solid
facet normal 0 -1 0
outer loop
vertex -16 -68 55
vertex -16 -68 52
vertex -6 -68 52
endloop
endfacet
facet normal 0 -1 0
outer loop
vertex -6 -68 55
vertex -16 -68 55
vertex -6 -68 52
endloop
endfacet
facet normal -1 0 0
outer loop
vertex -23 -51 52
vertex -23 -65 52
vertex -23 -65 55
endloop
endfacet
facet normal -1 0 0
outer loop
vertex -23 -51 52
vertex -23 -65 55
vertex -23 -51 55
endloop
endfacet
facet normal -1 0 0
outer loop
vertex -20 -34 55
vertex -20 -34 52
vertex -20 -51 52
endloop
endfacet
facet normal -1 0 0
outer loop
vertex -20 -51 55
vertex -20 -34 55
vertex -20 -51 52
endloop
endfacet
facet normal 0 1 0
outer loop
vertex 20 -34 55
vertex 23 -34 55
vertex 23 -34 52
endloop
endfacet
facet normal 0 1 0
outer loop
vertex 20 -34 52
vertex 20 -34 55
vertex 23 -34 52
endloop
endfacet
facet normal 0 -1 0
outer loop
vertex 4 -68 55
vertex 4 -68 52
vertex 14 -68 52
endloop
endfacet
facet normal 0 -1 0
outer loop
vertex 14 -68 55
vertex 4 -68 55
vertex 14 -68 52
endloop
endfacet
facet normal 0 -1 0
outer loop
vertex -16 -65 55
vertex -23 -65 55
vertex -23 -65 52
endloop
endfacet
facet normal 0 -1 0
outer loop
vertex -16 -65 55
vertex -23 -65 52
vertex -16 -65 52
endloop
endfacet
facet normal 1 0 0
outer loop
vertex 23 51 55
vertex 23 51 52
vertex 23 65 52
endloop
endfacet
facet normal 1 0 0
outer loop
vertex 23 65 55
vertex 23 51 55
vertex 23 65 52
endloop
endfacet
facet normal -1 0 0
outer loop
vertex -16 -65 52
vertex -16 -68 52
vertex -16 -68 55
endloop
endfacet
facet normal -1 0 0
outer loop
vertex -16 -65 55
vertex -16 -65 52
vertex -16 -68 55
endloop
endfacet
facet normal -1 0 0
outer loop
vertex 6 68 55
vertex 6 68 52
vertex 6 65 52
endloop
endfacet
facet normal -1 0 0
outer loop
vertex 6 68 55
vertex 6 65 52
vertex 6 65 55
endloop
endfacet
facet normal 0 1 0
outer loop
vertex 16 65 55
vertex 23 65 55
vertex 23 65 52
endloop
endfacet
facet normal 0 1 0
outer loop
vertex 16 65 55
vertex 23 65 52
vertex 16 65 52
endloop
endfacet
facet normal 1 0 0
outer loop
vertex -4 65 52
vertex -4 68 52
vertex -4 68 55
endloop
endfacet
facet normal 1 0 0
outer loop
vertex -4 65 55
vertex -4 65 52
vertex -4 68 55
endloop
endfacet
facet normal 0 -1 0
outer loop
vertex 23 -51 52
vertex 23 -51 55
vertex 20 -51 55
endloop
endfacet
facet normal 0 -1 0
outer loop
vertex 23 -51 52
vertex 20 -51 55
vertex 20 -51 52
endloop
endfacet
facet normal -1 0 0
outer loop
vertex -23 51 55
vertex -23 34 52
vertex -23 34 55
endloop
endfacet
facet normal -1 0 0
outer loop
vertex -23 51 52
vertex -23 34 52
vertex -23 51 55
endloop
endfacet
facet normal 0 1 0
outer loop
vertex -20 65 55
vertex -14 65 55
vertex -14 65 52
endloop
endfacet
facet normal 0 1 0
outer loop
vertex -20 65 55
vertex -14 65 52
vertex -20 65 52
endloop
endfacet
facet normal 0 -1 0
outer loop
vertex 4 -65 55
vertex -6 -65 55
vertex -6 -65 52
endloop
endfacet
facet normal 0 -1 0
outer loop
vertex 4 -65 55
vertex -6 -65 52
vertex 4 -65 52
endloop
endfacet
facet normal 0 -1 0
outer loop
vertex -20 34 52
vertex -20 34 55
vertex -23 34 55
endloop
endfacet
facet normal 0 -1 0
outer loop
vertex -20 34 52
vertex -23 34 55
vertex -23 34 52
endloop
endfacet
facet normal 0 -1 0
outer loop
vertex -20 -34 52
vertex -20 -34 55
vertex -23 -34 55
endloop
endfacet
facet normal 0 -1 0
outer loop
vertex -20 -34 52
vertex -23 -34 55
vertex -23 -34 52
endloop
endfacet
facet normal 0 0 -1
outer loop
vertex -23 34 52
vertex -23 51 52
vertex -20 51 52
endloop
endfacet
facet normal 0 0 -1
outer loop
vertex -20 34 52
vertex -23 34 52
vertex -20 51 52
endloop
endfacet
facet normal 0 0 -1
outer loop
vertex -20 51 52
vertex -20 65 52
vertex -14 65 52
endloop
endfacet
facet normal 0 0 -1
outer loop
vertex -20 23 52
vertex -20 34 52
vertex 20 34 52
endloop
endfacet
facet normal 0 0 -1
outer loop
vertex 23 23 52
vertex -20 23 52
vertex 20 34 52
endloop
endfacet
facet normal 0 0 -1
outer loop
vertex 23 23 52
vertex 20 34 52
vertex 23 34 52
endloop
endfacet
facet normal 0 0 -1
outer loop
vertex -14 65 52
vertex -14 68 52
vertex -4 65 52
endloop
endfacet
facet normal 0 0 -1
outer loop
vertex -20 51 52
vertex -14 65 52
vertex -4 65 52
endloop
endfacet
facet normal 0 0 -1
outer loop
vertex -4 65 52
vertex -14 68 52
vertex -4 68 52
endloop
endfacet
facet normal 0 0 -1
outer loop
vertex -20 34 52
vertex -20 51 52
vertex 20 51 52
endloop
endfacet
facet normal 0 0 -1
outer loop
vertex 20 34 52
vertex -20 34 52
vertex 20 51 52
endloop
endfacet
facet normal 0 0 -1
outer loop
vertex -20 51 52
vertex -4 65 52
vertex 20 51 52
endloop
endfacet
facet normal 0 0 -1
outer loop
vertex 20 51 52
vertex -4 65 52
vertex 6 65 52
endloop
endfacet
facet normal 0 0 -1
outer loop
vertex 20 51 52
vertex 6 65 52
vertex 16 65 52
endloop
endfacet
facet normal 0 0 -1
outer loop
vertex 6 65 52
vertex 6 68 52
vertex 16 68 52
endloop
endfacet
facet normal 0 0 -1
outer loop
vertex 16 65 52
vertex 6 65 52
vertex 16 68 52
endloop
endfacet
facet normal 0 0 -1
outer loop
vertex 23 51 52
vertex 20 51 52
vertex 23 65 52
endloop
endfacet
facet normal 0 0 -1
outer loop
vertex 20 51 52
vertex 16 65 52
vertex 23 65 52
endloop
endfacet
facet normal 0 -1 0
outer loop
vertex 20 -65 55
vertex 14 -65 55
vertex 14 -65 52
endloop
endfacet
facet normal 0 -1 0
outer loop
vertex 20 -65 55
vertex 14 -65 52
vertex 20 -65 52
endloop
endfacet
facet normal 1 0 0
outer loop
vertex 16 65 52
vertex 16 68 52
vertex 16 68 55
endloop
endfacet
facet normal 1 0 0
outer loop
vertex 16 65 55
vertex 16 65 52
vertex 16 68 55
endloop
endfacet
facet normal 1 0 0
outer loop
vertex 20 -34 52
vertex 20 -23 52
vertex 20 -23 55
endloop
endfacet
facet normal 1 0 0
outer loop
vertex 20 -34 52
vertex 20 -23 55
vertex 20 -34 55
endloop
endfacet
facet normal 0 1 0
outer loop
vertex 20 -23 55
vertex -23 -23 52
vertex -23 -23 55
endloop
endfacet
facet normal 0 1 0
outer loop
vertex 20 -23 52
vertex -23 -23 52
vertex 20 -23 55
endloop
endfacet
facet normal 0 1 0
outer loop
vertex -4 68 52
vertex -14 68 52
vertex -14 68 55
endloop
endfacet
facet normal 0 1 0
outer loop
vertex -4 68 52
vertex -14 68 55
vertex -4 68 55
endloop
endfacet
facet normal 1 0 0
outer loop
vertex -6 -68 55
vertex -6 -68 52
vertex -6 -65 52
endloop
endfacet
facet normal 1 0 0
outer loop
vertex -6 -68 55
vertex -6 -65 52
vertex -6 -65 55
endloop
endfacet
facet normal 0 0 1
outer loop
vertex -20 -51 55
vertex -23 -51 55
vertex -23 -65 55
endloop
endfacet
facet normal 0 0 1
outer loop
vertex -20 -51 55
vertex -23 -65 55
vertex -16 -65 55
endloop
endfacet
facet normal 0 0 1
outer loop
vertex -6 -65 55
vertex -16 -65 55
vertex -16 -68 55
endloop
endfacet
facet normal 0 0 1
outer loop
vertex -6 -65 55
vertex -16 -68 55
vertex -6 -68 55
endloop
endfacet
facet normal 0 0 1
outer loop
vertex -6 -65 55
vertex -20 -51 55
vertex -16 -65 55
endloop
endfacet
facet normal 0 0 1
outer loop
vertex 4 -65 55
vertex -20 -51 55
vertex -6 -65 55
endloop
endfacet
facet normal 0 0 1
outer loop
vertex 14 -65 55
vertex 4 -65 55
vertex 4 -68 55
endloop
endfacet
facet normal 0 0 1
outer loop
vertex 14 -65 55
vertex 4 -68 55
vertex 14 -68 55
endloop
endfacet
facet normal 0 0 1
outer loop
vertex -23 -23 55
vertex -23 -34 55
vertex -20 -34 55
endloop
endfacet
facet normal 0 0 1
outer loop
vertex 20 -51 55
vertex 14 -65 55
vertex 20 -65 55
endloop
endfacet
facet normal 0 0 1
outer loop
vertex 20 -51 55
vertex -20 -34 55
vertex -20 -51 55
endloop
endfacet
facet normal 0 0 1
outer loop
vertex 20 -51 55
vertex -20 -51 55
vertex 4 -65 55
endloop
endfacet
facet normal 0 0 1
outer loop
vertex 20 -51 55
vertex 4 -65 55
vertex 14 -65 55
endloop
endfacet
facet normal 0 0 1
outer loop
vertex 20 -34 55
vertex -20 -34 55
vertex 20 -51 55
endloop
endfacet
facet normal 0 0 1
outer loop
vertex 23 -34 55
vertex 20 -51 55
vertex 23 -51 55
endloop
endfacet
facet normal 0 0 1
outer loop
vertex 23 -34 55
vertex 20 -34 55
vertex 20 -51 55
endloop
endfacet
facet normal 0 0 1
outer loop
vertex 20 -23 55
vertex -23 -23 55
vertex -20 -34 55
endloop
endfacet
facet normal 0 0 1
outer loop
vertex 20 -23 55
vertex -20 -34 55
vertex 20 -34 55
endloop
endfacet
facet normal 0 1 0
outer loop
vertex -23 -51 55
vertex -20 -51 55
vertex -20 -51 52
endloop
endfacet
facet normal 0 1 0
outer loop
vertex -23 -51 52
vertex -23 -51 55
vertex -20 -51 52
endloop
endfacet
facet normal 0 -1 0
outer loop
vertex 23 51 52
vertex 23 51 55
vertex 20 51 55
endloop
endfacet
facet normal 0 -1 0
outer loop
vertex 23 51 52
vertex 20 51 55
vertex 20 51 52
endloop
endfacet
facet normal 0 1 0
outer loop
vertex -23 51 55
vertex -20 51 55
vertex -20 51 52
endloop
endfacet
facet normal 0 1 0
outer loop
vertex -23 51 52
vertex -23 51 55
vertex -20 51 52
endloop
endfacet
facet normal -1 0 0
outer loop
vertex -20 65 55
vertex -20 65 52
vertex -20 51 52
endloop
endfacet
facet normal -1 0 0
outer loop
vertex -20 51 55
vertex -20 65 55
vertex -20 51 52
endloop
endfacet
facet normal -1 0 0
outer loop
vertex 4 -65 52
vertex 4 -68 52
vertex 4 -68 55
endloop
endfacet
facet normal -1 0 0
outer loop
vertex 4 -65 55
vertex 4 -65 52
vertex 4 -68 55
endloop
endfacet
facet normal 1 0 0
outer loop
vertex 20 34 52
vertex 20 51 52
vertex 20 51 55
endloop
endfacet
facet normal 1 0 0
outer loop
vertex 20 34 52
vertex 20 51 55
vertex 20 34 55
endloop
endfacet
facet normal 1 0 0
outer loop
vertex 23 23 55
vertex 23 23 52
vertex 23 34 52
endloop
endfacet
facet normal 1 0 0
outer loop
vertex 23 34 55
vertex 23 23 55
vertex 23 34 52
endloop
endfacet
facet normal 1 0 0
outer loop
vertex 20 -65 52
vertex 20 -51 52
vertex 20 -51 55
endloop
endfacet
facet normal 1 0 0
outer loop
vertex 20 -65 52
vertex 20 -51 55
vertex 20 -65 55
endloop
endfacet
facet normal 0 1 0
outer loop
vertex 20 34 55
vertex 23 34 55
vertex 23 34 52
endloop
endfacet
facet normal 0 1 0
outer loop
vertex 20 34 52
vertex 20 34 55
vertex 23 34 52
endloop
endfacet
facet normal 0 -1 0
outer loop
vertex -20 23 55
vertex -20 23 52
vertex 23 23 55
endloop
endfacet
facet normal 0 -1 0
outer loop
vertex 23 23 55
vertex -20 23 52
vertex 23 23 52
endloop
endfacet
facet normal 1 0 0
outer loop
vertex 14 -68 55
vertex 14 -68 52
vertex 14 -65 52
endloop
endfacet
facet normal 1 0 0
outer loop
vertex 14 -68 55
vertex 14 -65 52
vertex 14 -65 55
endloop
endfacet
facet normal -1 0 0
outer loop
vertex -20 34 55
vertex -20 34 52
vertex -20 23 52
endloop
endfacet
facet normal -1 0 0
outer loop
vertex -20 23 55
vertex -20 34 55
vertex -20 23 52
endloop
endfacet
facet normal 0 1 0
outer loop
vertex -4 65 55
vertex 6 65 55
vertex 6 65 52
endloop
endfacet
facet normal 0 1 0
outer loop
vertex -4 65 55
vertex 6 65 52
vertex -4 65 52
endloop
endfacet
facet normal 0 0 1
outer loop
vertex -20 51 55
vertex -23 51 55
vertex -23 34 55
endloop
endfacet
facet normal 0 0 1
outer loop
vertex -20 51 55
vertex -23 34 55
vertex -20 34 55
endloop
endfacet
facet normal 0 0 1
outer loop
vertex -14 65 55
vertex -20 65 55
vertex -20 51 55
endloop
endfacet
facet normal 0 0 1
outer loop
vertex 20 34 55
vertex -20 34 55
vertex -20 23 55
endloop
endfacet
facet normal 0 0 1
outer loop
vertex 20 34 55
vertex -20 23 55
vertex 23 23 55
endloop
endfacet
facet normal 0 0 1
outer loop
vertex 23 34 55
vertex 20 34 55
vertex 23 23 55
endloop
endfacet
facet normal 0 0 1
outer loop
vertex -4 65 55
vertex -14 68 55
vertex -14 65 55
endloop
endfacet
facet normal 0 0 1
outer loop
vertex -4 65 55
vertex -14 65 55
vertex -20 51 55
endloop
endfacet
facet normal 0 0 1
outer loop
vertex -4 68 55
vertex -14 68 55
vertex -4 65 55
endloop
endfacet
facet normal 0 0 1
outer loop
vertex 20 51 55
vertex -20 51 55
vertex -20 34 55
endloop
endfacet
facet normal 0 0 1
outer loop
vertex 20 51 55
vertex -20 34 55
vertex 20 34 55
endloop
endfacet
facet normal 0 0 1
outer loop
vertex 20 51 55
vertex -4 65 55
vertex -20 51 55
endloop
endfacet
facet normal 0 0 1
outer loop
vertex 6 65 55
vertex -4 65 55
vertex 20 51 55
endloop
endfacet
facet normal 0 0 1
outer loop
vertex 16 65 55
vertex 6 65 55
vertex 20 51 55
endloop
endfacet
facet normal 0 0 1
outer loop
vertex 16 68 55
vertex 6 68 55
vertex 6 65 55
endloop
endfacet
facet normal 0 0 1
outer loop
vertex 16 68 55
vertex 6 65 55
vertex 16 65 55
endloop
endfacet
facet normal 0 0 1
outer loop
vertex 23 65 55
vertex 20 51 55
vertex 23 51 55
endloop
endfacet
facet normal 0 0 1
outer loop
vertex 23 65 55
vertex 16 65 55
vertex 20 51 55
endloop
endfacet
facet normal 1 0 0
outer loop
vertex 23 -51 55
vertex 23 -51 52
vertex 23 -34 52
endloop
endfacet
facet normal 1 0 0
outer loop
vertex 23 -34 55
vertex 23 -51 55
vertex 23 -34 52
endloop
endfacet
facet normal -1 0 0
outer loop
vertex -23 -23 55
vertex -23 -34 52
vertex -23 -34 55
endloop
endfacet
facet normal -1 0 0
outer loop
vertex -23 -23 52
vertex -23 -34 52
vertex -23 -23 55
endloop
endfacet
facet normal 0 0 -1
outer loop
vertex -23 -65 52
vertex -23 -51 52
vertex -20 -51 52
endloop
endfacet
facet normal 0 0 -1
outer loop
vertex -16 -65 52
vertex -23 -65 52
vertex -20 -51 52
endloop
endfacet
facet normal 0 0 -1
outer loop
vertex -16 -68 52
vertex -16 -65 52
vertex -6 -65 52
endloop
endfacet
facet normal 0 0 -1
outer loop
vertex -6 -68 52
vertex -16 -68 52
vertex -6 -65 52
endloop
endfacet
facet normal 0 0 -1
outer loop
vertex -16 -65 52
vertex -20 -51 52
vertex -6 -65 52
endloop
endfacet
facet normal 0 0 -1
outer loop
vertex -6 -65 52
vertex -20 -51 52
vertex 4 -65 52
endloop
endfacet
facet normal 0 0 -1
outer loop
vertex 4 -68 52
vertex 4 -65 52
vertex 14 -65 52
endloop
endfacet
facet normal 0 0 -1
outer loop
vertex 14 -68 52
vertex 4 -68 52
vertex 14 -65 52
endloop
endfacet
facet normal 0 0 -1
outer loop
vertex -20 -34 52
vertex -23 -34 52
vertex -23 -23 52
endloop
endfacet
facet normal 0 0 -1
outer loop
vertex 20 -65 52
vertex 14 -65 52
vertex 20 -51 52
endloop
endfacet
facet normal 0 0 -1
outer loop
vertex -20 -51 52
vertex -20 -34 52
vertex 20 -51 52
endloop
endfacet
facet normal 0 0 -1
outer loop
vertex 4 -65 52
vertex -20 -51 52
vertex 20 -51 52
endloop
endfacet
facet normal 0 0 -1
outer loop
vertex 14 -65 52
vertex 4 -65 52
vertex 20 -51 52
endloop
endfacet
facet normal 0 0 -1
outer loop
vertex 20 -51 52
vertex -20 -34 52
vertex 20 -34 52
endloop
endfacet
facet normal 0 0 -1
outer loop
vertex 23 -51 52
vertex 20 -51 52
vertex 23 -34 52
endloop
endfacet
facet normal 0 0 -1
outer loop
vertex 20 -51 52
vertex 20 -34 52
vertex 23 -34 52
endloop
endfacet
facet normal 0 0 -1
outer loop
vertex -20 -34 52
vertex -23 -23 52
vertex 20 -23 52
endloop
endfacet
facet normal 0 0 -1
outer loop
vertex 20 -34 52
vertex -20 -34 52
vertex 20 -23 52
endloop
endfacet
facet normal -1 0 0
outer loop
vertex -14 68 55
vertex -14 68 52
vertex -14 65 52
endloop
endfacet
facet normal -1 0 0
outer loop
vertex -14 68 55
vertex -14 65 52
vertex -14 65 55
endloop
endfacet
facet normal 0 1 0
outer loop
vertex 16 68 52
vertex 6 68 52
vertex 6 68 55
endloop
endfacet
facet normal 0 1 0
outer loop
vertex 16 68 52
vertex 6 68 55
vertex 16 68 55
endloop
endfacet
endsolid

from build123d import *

# Parameters (mm, degrees)
RECTANGLE072_AS_DRAWN_W                 = 8
RECTANGLE072_AS_DRAWN_H                 = 3
EXTRUDE082_DEPTH                        = 3
EXTRUDE082_ONTO_RECTANGLE072_ROLL_ANGLE = 90
RECTANGLE071_AS_DRAWN_W                 = 10
RECTANGLE071_AS_DRAWN_H                 = 3
EXTRUDE081_DEPTH                        = 3
EXTRUDE081_ONTO_RECTANGLE071_ROLL_ANGLE = 90
RECTANGLE070_AS_DRAWN_W                 = 7
RECTANGLE070_AS_DRAWN_H                 = 3
EXTRUDE080_DEPTH                        = 3
EXTRUDE080_ONTO_RECTANGLE070_ROLL_ANGLE = 90
FUSION060_PLACEMENT_ANGLE               = 180
RECTANGLE065_AS_DRAWN_W                 = 8
RECTANGLE065_AS_DRAWN_H                 = 3
EXTRUDE075_DEPTH                        = 3
EXTRUDE075_ONTO_RECTANGLE065_ROLL_ANGLE = 90
RECTANGLE064_AS_DRAWN_W                 = 10
RECTANGLE064_AS_DRAWN_H                 = 3
EXTRUDE074_DEPTH                        = 3
EXTRUDE074_ONTO_RECTANGLE064_ROLL_ANGLE = 90
RECTANGLE063_AS_DRAWN_W                 = 7
RECTANGLE063_AS_DRAWN_H                 = 3
EXTRUDE073_DEPTH                        = 3
EXTRUDE073_ONTO_RECTANGLE063_ROLL_ANGLE = 90
RECTANGLE051_W                          = 17
RECTANGLE051_H                          = 3
EXTRUDE061_DEPTH                        = 3
RECTANGLE052_W                          = 17
RECTANGLE052_H                          = 3
EXTRUDE062_DEPTH                        = 3
RECTANGLE053_W                          = 17
RECTANGLE053_H                          = 3
EXTRUDE063_DEPTH                        = 3
RECTANGLE050_W                          = 17
RECTANGLE050_H                          = 3
EXTRUDE060_DEPTH                        = 3
RECTANGLE055_W                          = 17
RECTANGLE055_H                          = 3
EXTRUDE065_DEPTH                        = 3
RECTANGLE056_W                          = 17
RECTANGLE056_H                          = 3
EXTRUDE066_DEPTH                        = 3
RECTANGLE057_W                          = 17
RECTANGLE057_H                          = 3
EXTRUDE067_DEPTH                        = 3
RECTANGLE054_W                          = 17
RECTANGLE054_H                          = 3
EXTRUDE064_DEPTH                        = 3
BOX019_W                                = 46
BOX019_H                                = 45
BOX019_DEPTH                            = 3
BOX020_W                                = 46
BOX020_H                                = 45
BOX020_DEPTH                            = 3
BOX008_W                                = 46
BOX008_H                                = 45
BOX008_DEPTH                            = 3
BOX009_W                                = 46
BOX009_H                                = 45
BOX009_DEPTH                            = 3


with BuildPart() as extrude082:
    # Rectangle072 as drawn → Extrude082 (new)
    with BuildSketch(Plane.XY):
        with Locations((-4, -1.5)):
            Rectangle(RECTANGLE072_AS_DRAWN_W, RECTANGLE072_AS_DRAWN_H)
    extrude(amount=-EXTRUDE082_DEPTH)


with BuildPart() as extrude082_1:
    # Extrude082 onto Rectangle072 roll: moved
    add(extrude082.part.rotate(Axis((0, 0, 0), (1, 0, 0)), EXTRUDE082_ONTO_RECTANGLE072_ROLL_ANGLE))


with BuildPart() as extrude082_2:
    # Extrude082 onto Rectangle072 placement: moved
    add(extrude082_1.part.moved(Location((-16, -68, 55))))


with BuildPart() as extrude081:
    # Rectangle071 as drawn → Extrude081 (new)
    with BuildSketch(Plane.XY):
        with Locations((-5, -1.5)):
            Rectangle(RECTANGLE071_AS_DRAWN_W, RECTANGLE071_AS_DRAWN_H)
    extrude(amount=-EXTRUDE081_DEPTH)


with BuildPart() as extrude081_1:
    # Extrude081 onto Rectangle071 roll: moved
    add(extrude081.part.rotate(Axis((0, 0, 0), (1, 0, 0)), EXTRUDE081_ONTO_RECTANGLE071_ROLL_ANGLE))


with BuildPart() as extrude081_2:
    # Extrude081 onto Rectangle071 placement: moved
    add(extrude081_1.part.moved(Location((4, -68, 55))))


with BuildPart() as finger_joints_aa002:
    # Rectangle070 as drawn → Extrude080 (new)
    with BuildSketch(Plane.XY):
        with Locations((-3.5, -1.5)):
            Rectangle(RECTANGLE070_AS_DRAWN_W, RECTANGLE070_AS_DRAWN_H)
    extrude(amount=-EXTRUDE080_DEPTH)


with BuildPart() as finger_joints_aa002_1:
    # Extrude080 onto Rectangle070 roll: moved
    add(finger_joints_aa002.part.rotate(Axis((0, 0, 0), (1, 0, 0)), EXTRUDE080_ONTO_RECTANGLE070_ROLL_ANGLE))


with BuildPart() as finger_joints_aa002_2:
    # Extrude080 onto Rectangle070 placement: moved
    add(finger_joints_aa002_1.part.moved(Location((21, -68, 55))))

    # Fusion060: union Extrude082, Extrude081
    add(extrude082_2.part)
    add(extrude081_2.part)


with BuildPart() as finger_joints_aa002_3:
    # Fusion060 placement: moved
    add(finger_joints_aa002_2.part.rotate(Axis((0, 0, 0), (0, 0, 1)), FUSION060_PLACEMENT_ANGLE))


with BuildPart() as extrude075:
    # Rectangle065 as drawn → Extrude075 (new)
    with BuildSketch(Plane.XY):
        with Locations((-4, -1.5)):
            Rectangle(RECTANGLE065_AS_DRAWN_W, RECTANGLE065_AS_DRAWN_H)
    extrude(amount=-EXTRUDE075_DEPTH)


with BuildPart() as extrude075_1:
    # Extrude075 onto Rectangle065 roll: moved
    add(extrude075.part.rotate(Axis((0, 0, 0), (1, 0, 0)), EXTRUDE075_ONTO_RECTANGLE065_ROLL_ANGLE))


with BuildPart() as extrude075_2:
    # Extrude075 onto Rectangle065 placement: moved
    add(extrude075_1.part.moved(Location((-16, -68, 55))))


with BuildPart() as extrude074:
    # Rectangle064 as drawn → Extrude074 (new)
    with BuildSketch(Plane.XY):
        with Locations((-5, -1.5)):
            Rectangle(RECTANGLE064_AS_DRAWN_W, RECTANGLE064_AS_DRAWN_H)
    extrude(amount=-EXTRUDE074_DEPTH)


with BuildPart() as extrude074_1:
    # Extrude074 onto Rectangle064 roll: moved
    add(extrude074.part.rotate(Axis((0, 0, 0), (1, 0, 0)), EXTRUDE074_ONTO_RECTANGLE064_ROLL_ANGLE))


with BuildPart() as extrude074_2:
    # Extrude074 onto Rectangle064 placement: moved
    add(extrude074_1.part.moved(Location((4, -68, 55))))


with BuildPart() as fusion061:
    # Rectangle063 as drawn → Extrude073 (new)
    with BuildSketch(Plane.XY):
        with Locations((-3.5, -1.5)):
            Rectangle(RECTANGLE063_AS_DRAWN_W, RECTANGLE063_AS_DRAWN_H)
    extrude(amount=-EXTRUDE073_DEPTH)


with BuildPart() as fusion061_1:
    # Extrude073 onto Rectangle063 roll: moved
    add(fusion061.part.rotate(Axis((0, 0, 0), (1, 0, 0)), EXTRUDE073_ONTO_RECTANGLE063_ROLL_ANGLE))


with BuildPart() as fusion061_2:
    # Extrude073 onto Rectangle063 placement: moved
    add(fusion061_1.part.moved(Location((21, -68, 55))))

    # Fusion056: union Extrude075, Extrude074
    add(extrude075_2.part)
    add(extrude074_2.part)

    # Fusion061: union Finger joints aa002
    add(finger_joints_aa002_3.part)


with BuildPart() as extrude061:
    # Rectangle051 → Extrude061 (new body)
    with BuildSketch(Plane(origin=(24, -34, 88), x_dir=(0, -1, 0), z_dir=(1, 0, 0))):
        with Locations((-8.5, 1.5)):
            Rectangle(RECTANGLE051_W, RECTANGLE051_H)
    extrude(amount=-EXTRUDE061_DEPTH)


with BuildPart() as extrude062:
    # Rectangle052 → Extrude062 (new body)
    with BuildSketch(Plane(origin=(24, 0, 88), x_dir=(0, -1, 0), z_dir=(1, 0, 0))):
        with Locations((-8.5, 1.5)):
            Rectangle(RECTANGLE052_W, RECTANGLE052_H)
    extrude(amount=-EXTRUDE062_DEPTH)


with BuildPart() as extrude063:
    # Rectangle053 → Extrude063 (new body)
    with BuildSketch(Plane(origin=(24, 34, 88), x_dir=(0, -1, 0), z_dir=(1, 0, 0))):
        with Locations((-8.5, 1.5)):
            Rectangle(RECTANGLE053_W, RECTANGLE053_H)
    extrude(amount=-EXTRUDE063_DEPTH)


with BuildPart() as finger_joints_a_front003:
    # Rectangle050 → Extrude060 (new body)
    with BuildSketch(Plane(origin=(24, -68, 88), x_dir=(0, -1, 0), z_dir=(1, 0, 0))):
        with Locations((-8.5, 1.5)):
            Rectangle(RECTANGLE050_W, RECTANGLE050_H)
    extrude(amount=-EXTRUDE060_DEPTH)

    # Fusion049: union Extrude061, Extrude062, Extrude063
    add(extrude061.part)
    add(extrude062.part)
    add(extrude063.part)


with BuildPart() as finger_joints_a_front003_1:
    # Fusion049 placement: moved
    add(finger_joints_a_front003.part.moved(Location((-1, 0, 0))))


with BuildPart() as extrude065:
    # Rectangle055 → Extrude065 (new body)
    with BuildSketch(Plane(origin=(24, -17, 88), x_dir=(0, -1, 0), z_dir=(1, 0, 0))):
        with Locations((-8.5, 1.5)):
            Rectangle(RECTANGLE055_W, RECTANGLE055_H)
    extrude(amount=-EXTRUDE065_DEPTH)


with BuildPart() as extrude066:
    # Rectangle056 → Extrude066 (new body)
    with BuildSketch(Plane(origin=(24, 17, 88), x_dir=(0, -1, 0), z_dir=(1, 0, 0))):
        with Locations((-8.5, 1.5)):
            Rectangle(RECTANGLE056_W, RECTANGLE056_H)
    extrude(amount=-EXTRUDE066_DEPTH)


with BuildPart() as extrude067:
    # Rectangle057 → Extrude067 (new body)
    with BuildSketch(Plane(origin=(24, 51, 88), x_dir=(0, -1, 0), z_dir=(1, 0, 0))):
        with Locations((-8.5, 1.5)):
            Rectangle(RECTANGLE057_W, RECTANGLE057_H)
    extrude(amount=-EXTRUDE067_DEPTH)


with BuildPart() as finger_joints_b003:
    # Rectangle054 → Extrude064 (new body)
    with BuildSketch(Plane(origin=(24, -51, 88), x_dir=(0, -1, 0), z_dir=(1, 0, 0))):
        with Locations((-8.5, 1.5)):
            Rectangle(RECTANGLE054_W, RECTANGLE054_H)
    extrude(amount=-EXTRUDE064_DEPTH)

    # Fusion050: union Extrude065, Extrude066, Extrude067
    add(extrude065.part)
    add(extrude066.part)
    add(extrude067.part)


with BuildPart() as finger_joints_b003_1:
    # Fusion050 placement: moved
    add(finger_joints_b003.part.moved(Location((-44, 0, 0))))

    # Fusion051: union Finger joints A front003
    add(finger_joints_a_front003_1.part)


with BuildPart() as finger_joints_b003_2:
    # Fusion051 placement: moved
    add(finger_joints_b003_1.part.moved(Location((0, 0, -33))))


with BuildPart() as carraige_base_smooth_side002:
    # Box019 → Box019 (new body)
    with BuildSketch(Plane(origin=(-23, -68, 52), x_dir=(1, 0, 0), z_dir=(0, 0, 1))):
        with Locations((23, 22.5)):
            Rectangle(BOX019_W, BOX019_H)
    extrude(amount=BOX019_DEPTH)


with BuildPart() as common001:
    # Box020 → Box020 (new body)
    with BuildSketch(Plane(origin=(-23, 23, 52), x_dir=(1, 0, 0), z_dir=(0, 0, 1))):
        with Locations((23, 22.5)):
            Rectangle(BOX020_W, BOX020_H)
    extrude(amount=BOX020_DEPTH)

    # Fusion052: union Carraige base smooth side002
    add(carraige_base_smooth_side002.part)

    # Common001: intersect Finger joints B003
    add(finger_joints_b003_2.part, mode=Mode.INTERSECT)


with BuildPart() as carraige_base_smooth_side:
    # Box008 → Box008 (new body)
    with BuildSketch(Plane(origin=(-23, -68, 52), x_dir=(1, 0, 0), z_dir=(0, 0, 1))):
        with Locations((23, 22.5)):
            Rectangle(BOX008_W, BOX008_H)
    extrude(amount=BOX008_DEPTH)


with BuildPart() as carriage_base_with_all_tabs:
    # Box009 → Box009 (new body)
    with BuildSketch(Plane(origin=(-23, 23, 52), x_dir=(1, 0, 0), z_dir=(0, 0, 1))):
        with Locations((23, 22.5)):
            Rectangle(BOX009_W, BOX009_H)
    extrude(amount=BOX009_DEPTH)

    # Fusion047: union Carraige base smooth side
    add(carraige_base_smooth_side.part)

    # Cut025: cut Common001
    add(common001.part, mode=Mode.SUBTRACT)

    # Cut026: cut Fusion061
    add(fusion061_2.part, mode=Mode.SUBTRACT)


solid = carriage_base_with_all_tabs.part
